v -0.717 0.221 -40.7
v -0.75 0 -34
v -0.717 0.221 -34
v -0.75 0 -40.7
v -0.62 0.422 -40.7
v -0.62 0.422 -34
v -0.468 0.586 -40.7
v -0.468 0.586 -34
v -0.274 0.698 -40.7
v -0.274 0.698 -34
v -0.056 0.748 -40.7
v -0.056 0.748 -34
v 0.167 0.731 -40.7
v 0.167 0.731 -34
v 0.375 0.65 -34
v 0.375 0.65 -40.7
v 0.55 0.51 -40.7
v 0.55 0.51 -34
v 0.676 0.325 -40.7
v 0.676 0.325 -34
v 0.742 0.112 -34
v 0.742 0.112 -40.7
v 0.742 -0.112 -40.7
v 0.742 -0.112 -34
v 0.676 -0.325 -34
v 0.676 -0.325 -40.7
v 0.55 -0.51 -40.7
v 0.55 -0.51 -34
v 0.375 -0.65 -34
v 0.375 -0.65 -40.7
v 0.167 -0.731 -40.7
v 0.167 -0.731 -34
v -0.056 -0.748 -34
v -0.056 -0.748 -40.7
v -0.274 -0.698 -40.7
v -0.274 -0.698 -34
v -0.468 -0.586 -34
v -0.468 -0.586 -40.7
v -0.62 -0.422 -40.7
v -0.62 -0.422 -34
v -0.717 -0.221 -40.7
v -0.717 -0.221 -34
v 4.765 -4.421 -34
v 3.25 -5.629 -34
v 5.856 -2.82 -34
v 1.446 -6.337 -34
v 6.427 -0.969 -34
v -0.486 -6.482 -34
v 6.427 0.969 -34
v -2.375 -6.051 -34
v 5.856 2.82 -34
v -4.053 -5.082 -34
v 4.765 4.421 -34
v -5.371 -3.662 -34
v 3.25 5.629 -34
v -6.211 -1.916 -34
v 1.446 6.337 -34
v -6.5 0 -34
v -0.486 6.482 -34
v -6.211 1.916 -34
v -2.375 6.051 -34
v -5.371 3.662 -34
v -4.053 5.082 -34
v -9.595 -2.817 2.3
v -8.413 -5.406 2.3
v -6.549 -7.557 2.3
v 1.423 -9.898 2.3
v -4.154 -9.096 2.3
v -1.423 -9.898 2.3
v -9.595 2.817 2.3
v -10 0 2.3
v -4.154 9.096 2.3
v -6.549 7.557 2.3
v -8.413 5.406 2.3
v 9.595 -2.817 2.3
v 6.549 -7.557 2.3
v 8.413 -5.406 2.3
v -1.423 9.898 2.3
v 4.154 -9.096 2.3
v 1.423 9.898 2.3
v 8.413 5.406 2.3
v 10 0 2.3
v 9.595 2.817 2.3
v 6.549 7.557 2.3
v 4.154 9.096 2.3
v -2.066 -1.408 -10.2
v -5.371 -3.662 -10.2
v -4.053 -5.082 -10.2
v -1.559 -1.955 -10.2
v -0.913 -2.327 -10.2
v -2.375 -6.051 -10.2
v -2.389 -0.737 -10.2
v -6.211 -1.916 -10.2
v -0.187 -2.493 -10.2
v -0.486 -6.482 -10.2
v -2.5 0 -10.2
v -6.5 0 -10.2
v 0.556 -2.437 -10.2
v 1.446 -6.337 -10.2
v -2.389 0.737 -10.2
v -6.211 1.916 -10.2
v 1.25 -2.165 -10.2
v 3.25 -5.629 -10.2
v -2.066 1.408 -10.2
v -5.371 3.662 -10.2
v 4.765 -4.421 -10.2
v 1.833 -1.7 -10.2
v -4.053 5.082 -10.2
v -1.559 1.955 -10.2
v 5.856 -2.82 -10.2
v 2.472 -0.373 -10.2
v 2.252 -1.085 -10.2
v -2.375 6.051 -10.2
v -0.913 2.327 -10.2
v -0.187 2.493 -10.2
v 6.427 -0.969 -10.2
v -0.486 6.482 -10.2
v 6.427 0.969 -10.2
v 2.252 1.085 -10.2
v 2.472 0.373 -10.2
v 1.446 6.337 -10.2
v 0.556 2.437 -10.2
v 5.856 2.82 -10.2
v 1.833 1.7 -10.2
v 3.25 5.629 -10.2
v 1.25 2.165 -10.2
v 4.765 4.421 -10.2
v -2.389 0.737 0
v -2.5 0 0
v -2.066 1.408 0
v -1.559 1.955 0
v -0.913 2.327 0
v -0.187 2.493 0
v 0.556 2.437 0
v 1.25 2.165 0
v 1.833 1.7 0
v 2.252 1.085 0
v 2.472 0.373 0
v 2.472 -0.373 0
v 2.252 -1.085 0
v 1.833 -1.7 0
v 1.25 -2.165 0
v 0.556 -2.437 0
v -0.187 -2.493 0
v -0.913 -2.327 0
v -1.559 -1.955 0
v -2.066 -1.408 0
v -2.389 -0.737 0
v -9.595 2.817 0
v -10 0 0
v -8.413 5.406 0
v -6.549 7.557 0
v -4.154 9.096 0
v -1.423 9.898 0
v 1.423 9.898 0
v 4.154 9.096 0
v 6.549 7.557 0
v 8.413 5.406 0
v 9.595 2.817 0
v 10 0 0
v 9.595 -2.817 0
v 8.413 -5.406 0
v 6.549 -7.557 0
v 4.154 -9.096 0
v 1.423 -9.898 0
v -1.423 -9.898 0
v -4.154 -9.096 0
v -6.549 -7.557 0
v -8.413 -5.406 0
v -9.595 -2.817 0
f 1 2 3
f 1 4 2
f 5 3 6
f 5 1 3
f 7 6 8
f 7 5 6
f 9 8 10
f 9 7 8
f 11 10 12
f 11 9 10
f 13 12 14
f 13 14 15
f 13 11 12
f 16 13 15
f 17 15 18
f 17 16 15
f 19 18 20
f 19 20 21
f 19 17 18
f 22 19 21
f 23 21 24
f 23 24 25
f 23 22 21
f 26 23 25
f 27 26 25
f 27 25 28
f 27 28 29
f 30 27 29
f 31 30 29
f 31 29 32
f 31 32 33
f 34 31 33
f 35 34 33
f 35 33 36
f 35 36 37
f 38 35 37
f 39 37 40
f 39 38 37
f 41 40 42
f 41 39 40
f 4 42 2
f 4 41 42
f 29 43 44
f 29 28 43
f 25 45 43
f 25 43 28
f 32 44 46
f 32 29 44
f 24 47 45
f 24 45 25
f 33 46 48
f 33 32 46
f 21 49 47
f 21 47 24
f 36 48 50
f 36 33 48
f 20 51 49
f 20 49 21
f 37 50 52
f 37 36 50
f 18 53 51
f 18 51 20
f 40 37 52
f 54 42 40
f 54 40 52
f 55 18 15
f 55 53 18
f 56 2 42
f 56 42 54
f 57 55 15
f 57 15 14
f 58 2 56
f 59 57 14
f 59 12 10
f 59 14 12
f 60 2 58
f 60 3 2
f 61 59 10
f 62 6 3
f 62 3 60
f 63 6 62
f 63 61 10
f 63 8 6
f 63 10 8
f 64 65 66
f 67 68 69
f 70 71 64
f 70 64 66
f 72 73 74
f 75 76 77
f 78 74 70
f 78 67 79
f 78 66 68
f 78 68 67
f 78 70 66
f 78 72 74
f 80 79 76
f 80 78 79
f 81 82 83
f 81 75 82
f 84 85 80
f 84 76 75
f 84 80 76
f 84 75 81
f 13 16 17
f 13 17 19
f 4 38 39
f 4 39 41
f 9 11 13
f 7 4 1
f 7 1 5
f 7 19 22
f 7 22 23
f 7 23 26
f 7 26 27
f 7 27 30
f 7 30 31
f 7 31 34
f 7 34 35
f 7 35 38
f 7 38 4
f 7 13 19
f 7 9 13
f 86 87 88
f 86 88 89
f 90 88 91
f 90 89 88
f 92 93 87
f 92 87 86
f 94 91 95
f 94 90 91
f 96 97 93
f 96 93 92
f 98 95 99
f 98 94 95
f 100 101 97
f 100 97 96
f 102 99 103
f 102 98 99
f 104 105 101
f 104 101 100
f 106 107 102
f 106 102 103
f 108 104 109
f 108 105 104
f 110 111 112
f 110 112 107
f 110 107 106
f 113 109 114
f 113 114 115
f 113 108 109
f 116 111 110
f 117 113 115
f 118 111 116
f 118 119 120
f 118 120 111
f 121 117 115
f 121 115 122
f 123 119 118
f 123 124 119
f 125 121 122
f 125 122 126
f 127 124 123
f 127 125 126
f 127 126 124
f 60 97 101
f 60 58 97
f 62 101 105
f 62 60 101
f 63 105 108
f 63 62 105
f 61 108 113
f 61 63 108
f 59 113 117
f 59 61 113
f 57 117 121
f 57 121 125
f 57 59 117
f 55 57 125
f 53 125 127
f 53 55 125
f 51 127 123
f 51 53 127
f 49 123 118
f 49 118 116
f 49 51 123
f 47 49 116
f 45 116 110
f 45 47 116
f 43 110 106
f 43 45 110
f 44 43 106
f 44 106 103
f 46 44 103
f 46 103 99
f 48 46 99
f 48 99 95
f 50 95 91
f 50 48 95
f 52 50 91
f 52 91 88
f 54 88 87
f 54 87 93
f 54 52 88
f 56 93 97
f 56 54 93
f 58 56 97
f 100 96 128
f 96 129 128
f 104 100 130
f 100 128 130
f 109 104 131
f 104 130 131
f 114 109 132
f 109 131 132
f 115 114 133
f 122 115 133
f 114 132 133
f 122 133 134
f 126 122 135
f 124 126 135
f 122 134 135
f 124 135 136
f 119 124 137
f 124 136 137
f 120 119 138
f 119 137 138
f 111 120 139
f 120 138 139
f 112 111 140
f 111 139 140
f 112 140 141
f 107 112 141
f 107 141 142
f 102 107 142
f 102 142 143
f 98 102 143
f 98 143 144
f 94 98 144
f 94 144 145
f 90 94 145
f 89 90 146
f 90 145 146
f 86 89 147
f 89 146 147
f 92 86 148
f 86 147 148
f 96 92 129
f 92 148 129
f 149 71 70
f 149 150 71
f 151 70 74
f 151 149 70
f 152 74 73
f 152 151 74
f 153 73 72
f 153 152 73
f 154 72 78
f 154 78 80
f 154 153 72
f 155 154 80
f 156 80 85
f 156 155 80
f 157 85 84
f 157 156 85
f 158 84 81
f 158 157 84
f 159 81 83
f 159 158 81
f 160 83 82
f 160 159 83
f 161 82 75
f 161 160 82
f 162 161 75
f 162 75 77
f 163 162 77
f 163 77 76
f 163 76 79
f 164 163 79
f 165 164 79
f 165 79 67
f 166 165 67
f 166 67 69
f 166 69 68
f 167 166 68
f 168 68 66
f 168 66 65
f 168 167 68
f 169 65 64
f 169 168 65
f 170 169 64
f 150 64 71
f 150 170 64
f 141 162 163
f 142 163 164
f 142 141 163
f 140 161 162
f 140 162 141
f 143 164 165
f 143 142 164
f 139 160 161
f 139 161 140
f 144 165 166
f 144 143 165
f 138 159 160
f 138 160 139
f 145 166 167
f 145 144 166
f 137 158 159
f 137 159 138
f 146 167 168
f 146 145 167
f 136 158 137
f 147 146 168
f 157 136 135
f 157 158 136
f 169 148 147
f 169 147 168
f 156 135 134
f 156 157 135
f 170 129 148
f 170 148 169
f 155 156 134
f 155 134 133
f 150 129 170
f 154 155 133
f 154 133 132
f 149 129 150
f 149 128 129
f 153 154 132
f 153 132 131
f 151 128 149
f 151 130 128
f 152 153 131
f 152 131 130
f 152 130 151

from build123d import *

# Parameters (mm, degrees)
F0_W = 2.4999999441
F0_H = 10.1996297166


# Not quite as in the source:
# - ends of sketch curves that miss each other by under 0.0002 mm in the source are joined


with BuildPart() as f1:
    # F0 (on Front) → F1 (revolve)
    with BuildSketch(Plane.XZ):
        Polygon((0, -34.0000009239), (0, -10.1996297166), (-2.4999999441, -10.1996297166), (-6.5000001341, -10.1996297166), (-6.5000001341, -34), (-0.75, -34), align=None)
        with Locations((-1.2499999721, -5.0998148583)):
            Rectangle(F0_W, F0_H)
        Polygon((0, 2.3), (-10, 2.3), (-10, 0), (-2.4999999441, 0), (0, 0), align=None)
        Polygon((0, -40.7000018477), (0, -34.0000009239), (-0.75, -34), (-0.75, -40.7000018477), align=None)
    revolve(axis=Axis((0, 0, -22.5782128982), (0, 0, -1)))


solid = f1.part
